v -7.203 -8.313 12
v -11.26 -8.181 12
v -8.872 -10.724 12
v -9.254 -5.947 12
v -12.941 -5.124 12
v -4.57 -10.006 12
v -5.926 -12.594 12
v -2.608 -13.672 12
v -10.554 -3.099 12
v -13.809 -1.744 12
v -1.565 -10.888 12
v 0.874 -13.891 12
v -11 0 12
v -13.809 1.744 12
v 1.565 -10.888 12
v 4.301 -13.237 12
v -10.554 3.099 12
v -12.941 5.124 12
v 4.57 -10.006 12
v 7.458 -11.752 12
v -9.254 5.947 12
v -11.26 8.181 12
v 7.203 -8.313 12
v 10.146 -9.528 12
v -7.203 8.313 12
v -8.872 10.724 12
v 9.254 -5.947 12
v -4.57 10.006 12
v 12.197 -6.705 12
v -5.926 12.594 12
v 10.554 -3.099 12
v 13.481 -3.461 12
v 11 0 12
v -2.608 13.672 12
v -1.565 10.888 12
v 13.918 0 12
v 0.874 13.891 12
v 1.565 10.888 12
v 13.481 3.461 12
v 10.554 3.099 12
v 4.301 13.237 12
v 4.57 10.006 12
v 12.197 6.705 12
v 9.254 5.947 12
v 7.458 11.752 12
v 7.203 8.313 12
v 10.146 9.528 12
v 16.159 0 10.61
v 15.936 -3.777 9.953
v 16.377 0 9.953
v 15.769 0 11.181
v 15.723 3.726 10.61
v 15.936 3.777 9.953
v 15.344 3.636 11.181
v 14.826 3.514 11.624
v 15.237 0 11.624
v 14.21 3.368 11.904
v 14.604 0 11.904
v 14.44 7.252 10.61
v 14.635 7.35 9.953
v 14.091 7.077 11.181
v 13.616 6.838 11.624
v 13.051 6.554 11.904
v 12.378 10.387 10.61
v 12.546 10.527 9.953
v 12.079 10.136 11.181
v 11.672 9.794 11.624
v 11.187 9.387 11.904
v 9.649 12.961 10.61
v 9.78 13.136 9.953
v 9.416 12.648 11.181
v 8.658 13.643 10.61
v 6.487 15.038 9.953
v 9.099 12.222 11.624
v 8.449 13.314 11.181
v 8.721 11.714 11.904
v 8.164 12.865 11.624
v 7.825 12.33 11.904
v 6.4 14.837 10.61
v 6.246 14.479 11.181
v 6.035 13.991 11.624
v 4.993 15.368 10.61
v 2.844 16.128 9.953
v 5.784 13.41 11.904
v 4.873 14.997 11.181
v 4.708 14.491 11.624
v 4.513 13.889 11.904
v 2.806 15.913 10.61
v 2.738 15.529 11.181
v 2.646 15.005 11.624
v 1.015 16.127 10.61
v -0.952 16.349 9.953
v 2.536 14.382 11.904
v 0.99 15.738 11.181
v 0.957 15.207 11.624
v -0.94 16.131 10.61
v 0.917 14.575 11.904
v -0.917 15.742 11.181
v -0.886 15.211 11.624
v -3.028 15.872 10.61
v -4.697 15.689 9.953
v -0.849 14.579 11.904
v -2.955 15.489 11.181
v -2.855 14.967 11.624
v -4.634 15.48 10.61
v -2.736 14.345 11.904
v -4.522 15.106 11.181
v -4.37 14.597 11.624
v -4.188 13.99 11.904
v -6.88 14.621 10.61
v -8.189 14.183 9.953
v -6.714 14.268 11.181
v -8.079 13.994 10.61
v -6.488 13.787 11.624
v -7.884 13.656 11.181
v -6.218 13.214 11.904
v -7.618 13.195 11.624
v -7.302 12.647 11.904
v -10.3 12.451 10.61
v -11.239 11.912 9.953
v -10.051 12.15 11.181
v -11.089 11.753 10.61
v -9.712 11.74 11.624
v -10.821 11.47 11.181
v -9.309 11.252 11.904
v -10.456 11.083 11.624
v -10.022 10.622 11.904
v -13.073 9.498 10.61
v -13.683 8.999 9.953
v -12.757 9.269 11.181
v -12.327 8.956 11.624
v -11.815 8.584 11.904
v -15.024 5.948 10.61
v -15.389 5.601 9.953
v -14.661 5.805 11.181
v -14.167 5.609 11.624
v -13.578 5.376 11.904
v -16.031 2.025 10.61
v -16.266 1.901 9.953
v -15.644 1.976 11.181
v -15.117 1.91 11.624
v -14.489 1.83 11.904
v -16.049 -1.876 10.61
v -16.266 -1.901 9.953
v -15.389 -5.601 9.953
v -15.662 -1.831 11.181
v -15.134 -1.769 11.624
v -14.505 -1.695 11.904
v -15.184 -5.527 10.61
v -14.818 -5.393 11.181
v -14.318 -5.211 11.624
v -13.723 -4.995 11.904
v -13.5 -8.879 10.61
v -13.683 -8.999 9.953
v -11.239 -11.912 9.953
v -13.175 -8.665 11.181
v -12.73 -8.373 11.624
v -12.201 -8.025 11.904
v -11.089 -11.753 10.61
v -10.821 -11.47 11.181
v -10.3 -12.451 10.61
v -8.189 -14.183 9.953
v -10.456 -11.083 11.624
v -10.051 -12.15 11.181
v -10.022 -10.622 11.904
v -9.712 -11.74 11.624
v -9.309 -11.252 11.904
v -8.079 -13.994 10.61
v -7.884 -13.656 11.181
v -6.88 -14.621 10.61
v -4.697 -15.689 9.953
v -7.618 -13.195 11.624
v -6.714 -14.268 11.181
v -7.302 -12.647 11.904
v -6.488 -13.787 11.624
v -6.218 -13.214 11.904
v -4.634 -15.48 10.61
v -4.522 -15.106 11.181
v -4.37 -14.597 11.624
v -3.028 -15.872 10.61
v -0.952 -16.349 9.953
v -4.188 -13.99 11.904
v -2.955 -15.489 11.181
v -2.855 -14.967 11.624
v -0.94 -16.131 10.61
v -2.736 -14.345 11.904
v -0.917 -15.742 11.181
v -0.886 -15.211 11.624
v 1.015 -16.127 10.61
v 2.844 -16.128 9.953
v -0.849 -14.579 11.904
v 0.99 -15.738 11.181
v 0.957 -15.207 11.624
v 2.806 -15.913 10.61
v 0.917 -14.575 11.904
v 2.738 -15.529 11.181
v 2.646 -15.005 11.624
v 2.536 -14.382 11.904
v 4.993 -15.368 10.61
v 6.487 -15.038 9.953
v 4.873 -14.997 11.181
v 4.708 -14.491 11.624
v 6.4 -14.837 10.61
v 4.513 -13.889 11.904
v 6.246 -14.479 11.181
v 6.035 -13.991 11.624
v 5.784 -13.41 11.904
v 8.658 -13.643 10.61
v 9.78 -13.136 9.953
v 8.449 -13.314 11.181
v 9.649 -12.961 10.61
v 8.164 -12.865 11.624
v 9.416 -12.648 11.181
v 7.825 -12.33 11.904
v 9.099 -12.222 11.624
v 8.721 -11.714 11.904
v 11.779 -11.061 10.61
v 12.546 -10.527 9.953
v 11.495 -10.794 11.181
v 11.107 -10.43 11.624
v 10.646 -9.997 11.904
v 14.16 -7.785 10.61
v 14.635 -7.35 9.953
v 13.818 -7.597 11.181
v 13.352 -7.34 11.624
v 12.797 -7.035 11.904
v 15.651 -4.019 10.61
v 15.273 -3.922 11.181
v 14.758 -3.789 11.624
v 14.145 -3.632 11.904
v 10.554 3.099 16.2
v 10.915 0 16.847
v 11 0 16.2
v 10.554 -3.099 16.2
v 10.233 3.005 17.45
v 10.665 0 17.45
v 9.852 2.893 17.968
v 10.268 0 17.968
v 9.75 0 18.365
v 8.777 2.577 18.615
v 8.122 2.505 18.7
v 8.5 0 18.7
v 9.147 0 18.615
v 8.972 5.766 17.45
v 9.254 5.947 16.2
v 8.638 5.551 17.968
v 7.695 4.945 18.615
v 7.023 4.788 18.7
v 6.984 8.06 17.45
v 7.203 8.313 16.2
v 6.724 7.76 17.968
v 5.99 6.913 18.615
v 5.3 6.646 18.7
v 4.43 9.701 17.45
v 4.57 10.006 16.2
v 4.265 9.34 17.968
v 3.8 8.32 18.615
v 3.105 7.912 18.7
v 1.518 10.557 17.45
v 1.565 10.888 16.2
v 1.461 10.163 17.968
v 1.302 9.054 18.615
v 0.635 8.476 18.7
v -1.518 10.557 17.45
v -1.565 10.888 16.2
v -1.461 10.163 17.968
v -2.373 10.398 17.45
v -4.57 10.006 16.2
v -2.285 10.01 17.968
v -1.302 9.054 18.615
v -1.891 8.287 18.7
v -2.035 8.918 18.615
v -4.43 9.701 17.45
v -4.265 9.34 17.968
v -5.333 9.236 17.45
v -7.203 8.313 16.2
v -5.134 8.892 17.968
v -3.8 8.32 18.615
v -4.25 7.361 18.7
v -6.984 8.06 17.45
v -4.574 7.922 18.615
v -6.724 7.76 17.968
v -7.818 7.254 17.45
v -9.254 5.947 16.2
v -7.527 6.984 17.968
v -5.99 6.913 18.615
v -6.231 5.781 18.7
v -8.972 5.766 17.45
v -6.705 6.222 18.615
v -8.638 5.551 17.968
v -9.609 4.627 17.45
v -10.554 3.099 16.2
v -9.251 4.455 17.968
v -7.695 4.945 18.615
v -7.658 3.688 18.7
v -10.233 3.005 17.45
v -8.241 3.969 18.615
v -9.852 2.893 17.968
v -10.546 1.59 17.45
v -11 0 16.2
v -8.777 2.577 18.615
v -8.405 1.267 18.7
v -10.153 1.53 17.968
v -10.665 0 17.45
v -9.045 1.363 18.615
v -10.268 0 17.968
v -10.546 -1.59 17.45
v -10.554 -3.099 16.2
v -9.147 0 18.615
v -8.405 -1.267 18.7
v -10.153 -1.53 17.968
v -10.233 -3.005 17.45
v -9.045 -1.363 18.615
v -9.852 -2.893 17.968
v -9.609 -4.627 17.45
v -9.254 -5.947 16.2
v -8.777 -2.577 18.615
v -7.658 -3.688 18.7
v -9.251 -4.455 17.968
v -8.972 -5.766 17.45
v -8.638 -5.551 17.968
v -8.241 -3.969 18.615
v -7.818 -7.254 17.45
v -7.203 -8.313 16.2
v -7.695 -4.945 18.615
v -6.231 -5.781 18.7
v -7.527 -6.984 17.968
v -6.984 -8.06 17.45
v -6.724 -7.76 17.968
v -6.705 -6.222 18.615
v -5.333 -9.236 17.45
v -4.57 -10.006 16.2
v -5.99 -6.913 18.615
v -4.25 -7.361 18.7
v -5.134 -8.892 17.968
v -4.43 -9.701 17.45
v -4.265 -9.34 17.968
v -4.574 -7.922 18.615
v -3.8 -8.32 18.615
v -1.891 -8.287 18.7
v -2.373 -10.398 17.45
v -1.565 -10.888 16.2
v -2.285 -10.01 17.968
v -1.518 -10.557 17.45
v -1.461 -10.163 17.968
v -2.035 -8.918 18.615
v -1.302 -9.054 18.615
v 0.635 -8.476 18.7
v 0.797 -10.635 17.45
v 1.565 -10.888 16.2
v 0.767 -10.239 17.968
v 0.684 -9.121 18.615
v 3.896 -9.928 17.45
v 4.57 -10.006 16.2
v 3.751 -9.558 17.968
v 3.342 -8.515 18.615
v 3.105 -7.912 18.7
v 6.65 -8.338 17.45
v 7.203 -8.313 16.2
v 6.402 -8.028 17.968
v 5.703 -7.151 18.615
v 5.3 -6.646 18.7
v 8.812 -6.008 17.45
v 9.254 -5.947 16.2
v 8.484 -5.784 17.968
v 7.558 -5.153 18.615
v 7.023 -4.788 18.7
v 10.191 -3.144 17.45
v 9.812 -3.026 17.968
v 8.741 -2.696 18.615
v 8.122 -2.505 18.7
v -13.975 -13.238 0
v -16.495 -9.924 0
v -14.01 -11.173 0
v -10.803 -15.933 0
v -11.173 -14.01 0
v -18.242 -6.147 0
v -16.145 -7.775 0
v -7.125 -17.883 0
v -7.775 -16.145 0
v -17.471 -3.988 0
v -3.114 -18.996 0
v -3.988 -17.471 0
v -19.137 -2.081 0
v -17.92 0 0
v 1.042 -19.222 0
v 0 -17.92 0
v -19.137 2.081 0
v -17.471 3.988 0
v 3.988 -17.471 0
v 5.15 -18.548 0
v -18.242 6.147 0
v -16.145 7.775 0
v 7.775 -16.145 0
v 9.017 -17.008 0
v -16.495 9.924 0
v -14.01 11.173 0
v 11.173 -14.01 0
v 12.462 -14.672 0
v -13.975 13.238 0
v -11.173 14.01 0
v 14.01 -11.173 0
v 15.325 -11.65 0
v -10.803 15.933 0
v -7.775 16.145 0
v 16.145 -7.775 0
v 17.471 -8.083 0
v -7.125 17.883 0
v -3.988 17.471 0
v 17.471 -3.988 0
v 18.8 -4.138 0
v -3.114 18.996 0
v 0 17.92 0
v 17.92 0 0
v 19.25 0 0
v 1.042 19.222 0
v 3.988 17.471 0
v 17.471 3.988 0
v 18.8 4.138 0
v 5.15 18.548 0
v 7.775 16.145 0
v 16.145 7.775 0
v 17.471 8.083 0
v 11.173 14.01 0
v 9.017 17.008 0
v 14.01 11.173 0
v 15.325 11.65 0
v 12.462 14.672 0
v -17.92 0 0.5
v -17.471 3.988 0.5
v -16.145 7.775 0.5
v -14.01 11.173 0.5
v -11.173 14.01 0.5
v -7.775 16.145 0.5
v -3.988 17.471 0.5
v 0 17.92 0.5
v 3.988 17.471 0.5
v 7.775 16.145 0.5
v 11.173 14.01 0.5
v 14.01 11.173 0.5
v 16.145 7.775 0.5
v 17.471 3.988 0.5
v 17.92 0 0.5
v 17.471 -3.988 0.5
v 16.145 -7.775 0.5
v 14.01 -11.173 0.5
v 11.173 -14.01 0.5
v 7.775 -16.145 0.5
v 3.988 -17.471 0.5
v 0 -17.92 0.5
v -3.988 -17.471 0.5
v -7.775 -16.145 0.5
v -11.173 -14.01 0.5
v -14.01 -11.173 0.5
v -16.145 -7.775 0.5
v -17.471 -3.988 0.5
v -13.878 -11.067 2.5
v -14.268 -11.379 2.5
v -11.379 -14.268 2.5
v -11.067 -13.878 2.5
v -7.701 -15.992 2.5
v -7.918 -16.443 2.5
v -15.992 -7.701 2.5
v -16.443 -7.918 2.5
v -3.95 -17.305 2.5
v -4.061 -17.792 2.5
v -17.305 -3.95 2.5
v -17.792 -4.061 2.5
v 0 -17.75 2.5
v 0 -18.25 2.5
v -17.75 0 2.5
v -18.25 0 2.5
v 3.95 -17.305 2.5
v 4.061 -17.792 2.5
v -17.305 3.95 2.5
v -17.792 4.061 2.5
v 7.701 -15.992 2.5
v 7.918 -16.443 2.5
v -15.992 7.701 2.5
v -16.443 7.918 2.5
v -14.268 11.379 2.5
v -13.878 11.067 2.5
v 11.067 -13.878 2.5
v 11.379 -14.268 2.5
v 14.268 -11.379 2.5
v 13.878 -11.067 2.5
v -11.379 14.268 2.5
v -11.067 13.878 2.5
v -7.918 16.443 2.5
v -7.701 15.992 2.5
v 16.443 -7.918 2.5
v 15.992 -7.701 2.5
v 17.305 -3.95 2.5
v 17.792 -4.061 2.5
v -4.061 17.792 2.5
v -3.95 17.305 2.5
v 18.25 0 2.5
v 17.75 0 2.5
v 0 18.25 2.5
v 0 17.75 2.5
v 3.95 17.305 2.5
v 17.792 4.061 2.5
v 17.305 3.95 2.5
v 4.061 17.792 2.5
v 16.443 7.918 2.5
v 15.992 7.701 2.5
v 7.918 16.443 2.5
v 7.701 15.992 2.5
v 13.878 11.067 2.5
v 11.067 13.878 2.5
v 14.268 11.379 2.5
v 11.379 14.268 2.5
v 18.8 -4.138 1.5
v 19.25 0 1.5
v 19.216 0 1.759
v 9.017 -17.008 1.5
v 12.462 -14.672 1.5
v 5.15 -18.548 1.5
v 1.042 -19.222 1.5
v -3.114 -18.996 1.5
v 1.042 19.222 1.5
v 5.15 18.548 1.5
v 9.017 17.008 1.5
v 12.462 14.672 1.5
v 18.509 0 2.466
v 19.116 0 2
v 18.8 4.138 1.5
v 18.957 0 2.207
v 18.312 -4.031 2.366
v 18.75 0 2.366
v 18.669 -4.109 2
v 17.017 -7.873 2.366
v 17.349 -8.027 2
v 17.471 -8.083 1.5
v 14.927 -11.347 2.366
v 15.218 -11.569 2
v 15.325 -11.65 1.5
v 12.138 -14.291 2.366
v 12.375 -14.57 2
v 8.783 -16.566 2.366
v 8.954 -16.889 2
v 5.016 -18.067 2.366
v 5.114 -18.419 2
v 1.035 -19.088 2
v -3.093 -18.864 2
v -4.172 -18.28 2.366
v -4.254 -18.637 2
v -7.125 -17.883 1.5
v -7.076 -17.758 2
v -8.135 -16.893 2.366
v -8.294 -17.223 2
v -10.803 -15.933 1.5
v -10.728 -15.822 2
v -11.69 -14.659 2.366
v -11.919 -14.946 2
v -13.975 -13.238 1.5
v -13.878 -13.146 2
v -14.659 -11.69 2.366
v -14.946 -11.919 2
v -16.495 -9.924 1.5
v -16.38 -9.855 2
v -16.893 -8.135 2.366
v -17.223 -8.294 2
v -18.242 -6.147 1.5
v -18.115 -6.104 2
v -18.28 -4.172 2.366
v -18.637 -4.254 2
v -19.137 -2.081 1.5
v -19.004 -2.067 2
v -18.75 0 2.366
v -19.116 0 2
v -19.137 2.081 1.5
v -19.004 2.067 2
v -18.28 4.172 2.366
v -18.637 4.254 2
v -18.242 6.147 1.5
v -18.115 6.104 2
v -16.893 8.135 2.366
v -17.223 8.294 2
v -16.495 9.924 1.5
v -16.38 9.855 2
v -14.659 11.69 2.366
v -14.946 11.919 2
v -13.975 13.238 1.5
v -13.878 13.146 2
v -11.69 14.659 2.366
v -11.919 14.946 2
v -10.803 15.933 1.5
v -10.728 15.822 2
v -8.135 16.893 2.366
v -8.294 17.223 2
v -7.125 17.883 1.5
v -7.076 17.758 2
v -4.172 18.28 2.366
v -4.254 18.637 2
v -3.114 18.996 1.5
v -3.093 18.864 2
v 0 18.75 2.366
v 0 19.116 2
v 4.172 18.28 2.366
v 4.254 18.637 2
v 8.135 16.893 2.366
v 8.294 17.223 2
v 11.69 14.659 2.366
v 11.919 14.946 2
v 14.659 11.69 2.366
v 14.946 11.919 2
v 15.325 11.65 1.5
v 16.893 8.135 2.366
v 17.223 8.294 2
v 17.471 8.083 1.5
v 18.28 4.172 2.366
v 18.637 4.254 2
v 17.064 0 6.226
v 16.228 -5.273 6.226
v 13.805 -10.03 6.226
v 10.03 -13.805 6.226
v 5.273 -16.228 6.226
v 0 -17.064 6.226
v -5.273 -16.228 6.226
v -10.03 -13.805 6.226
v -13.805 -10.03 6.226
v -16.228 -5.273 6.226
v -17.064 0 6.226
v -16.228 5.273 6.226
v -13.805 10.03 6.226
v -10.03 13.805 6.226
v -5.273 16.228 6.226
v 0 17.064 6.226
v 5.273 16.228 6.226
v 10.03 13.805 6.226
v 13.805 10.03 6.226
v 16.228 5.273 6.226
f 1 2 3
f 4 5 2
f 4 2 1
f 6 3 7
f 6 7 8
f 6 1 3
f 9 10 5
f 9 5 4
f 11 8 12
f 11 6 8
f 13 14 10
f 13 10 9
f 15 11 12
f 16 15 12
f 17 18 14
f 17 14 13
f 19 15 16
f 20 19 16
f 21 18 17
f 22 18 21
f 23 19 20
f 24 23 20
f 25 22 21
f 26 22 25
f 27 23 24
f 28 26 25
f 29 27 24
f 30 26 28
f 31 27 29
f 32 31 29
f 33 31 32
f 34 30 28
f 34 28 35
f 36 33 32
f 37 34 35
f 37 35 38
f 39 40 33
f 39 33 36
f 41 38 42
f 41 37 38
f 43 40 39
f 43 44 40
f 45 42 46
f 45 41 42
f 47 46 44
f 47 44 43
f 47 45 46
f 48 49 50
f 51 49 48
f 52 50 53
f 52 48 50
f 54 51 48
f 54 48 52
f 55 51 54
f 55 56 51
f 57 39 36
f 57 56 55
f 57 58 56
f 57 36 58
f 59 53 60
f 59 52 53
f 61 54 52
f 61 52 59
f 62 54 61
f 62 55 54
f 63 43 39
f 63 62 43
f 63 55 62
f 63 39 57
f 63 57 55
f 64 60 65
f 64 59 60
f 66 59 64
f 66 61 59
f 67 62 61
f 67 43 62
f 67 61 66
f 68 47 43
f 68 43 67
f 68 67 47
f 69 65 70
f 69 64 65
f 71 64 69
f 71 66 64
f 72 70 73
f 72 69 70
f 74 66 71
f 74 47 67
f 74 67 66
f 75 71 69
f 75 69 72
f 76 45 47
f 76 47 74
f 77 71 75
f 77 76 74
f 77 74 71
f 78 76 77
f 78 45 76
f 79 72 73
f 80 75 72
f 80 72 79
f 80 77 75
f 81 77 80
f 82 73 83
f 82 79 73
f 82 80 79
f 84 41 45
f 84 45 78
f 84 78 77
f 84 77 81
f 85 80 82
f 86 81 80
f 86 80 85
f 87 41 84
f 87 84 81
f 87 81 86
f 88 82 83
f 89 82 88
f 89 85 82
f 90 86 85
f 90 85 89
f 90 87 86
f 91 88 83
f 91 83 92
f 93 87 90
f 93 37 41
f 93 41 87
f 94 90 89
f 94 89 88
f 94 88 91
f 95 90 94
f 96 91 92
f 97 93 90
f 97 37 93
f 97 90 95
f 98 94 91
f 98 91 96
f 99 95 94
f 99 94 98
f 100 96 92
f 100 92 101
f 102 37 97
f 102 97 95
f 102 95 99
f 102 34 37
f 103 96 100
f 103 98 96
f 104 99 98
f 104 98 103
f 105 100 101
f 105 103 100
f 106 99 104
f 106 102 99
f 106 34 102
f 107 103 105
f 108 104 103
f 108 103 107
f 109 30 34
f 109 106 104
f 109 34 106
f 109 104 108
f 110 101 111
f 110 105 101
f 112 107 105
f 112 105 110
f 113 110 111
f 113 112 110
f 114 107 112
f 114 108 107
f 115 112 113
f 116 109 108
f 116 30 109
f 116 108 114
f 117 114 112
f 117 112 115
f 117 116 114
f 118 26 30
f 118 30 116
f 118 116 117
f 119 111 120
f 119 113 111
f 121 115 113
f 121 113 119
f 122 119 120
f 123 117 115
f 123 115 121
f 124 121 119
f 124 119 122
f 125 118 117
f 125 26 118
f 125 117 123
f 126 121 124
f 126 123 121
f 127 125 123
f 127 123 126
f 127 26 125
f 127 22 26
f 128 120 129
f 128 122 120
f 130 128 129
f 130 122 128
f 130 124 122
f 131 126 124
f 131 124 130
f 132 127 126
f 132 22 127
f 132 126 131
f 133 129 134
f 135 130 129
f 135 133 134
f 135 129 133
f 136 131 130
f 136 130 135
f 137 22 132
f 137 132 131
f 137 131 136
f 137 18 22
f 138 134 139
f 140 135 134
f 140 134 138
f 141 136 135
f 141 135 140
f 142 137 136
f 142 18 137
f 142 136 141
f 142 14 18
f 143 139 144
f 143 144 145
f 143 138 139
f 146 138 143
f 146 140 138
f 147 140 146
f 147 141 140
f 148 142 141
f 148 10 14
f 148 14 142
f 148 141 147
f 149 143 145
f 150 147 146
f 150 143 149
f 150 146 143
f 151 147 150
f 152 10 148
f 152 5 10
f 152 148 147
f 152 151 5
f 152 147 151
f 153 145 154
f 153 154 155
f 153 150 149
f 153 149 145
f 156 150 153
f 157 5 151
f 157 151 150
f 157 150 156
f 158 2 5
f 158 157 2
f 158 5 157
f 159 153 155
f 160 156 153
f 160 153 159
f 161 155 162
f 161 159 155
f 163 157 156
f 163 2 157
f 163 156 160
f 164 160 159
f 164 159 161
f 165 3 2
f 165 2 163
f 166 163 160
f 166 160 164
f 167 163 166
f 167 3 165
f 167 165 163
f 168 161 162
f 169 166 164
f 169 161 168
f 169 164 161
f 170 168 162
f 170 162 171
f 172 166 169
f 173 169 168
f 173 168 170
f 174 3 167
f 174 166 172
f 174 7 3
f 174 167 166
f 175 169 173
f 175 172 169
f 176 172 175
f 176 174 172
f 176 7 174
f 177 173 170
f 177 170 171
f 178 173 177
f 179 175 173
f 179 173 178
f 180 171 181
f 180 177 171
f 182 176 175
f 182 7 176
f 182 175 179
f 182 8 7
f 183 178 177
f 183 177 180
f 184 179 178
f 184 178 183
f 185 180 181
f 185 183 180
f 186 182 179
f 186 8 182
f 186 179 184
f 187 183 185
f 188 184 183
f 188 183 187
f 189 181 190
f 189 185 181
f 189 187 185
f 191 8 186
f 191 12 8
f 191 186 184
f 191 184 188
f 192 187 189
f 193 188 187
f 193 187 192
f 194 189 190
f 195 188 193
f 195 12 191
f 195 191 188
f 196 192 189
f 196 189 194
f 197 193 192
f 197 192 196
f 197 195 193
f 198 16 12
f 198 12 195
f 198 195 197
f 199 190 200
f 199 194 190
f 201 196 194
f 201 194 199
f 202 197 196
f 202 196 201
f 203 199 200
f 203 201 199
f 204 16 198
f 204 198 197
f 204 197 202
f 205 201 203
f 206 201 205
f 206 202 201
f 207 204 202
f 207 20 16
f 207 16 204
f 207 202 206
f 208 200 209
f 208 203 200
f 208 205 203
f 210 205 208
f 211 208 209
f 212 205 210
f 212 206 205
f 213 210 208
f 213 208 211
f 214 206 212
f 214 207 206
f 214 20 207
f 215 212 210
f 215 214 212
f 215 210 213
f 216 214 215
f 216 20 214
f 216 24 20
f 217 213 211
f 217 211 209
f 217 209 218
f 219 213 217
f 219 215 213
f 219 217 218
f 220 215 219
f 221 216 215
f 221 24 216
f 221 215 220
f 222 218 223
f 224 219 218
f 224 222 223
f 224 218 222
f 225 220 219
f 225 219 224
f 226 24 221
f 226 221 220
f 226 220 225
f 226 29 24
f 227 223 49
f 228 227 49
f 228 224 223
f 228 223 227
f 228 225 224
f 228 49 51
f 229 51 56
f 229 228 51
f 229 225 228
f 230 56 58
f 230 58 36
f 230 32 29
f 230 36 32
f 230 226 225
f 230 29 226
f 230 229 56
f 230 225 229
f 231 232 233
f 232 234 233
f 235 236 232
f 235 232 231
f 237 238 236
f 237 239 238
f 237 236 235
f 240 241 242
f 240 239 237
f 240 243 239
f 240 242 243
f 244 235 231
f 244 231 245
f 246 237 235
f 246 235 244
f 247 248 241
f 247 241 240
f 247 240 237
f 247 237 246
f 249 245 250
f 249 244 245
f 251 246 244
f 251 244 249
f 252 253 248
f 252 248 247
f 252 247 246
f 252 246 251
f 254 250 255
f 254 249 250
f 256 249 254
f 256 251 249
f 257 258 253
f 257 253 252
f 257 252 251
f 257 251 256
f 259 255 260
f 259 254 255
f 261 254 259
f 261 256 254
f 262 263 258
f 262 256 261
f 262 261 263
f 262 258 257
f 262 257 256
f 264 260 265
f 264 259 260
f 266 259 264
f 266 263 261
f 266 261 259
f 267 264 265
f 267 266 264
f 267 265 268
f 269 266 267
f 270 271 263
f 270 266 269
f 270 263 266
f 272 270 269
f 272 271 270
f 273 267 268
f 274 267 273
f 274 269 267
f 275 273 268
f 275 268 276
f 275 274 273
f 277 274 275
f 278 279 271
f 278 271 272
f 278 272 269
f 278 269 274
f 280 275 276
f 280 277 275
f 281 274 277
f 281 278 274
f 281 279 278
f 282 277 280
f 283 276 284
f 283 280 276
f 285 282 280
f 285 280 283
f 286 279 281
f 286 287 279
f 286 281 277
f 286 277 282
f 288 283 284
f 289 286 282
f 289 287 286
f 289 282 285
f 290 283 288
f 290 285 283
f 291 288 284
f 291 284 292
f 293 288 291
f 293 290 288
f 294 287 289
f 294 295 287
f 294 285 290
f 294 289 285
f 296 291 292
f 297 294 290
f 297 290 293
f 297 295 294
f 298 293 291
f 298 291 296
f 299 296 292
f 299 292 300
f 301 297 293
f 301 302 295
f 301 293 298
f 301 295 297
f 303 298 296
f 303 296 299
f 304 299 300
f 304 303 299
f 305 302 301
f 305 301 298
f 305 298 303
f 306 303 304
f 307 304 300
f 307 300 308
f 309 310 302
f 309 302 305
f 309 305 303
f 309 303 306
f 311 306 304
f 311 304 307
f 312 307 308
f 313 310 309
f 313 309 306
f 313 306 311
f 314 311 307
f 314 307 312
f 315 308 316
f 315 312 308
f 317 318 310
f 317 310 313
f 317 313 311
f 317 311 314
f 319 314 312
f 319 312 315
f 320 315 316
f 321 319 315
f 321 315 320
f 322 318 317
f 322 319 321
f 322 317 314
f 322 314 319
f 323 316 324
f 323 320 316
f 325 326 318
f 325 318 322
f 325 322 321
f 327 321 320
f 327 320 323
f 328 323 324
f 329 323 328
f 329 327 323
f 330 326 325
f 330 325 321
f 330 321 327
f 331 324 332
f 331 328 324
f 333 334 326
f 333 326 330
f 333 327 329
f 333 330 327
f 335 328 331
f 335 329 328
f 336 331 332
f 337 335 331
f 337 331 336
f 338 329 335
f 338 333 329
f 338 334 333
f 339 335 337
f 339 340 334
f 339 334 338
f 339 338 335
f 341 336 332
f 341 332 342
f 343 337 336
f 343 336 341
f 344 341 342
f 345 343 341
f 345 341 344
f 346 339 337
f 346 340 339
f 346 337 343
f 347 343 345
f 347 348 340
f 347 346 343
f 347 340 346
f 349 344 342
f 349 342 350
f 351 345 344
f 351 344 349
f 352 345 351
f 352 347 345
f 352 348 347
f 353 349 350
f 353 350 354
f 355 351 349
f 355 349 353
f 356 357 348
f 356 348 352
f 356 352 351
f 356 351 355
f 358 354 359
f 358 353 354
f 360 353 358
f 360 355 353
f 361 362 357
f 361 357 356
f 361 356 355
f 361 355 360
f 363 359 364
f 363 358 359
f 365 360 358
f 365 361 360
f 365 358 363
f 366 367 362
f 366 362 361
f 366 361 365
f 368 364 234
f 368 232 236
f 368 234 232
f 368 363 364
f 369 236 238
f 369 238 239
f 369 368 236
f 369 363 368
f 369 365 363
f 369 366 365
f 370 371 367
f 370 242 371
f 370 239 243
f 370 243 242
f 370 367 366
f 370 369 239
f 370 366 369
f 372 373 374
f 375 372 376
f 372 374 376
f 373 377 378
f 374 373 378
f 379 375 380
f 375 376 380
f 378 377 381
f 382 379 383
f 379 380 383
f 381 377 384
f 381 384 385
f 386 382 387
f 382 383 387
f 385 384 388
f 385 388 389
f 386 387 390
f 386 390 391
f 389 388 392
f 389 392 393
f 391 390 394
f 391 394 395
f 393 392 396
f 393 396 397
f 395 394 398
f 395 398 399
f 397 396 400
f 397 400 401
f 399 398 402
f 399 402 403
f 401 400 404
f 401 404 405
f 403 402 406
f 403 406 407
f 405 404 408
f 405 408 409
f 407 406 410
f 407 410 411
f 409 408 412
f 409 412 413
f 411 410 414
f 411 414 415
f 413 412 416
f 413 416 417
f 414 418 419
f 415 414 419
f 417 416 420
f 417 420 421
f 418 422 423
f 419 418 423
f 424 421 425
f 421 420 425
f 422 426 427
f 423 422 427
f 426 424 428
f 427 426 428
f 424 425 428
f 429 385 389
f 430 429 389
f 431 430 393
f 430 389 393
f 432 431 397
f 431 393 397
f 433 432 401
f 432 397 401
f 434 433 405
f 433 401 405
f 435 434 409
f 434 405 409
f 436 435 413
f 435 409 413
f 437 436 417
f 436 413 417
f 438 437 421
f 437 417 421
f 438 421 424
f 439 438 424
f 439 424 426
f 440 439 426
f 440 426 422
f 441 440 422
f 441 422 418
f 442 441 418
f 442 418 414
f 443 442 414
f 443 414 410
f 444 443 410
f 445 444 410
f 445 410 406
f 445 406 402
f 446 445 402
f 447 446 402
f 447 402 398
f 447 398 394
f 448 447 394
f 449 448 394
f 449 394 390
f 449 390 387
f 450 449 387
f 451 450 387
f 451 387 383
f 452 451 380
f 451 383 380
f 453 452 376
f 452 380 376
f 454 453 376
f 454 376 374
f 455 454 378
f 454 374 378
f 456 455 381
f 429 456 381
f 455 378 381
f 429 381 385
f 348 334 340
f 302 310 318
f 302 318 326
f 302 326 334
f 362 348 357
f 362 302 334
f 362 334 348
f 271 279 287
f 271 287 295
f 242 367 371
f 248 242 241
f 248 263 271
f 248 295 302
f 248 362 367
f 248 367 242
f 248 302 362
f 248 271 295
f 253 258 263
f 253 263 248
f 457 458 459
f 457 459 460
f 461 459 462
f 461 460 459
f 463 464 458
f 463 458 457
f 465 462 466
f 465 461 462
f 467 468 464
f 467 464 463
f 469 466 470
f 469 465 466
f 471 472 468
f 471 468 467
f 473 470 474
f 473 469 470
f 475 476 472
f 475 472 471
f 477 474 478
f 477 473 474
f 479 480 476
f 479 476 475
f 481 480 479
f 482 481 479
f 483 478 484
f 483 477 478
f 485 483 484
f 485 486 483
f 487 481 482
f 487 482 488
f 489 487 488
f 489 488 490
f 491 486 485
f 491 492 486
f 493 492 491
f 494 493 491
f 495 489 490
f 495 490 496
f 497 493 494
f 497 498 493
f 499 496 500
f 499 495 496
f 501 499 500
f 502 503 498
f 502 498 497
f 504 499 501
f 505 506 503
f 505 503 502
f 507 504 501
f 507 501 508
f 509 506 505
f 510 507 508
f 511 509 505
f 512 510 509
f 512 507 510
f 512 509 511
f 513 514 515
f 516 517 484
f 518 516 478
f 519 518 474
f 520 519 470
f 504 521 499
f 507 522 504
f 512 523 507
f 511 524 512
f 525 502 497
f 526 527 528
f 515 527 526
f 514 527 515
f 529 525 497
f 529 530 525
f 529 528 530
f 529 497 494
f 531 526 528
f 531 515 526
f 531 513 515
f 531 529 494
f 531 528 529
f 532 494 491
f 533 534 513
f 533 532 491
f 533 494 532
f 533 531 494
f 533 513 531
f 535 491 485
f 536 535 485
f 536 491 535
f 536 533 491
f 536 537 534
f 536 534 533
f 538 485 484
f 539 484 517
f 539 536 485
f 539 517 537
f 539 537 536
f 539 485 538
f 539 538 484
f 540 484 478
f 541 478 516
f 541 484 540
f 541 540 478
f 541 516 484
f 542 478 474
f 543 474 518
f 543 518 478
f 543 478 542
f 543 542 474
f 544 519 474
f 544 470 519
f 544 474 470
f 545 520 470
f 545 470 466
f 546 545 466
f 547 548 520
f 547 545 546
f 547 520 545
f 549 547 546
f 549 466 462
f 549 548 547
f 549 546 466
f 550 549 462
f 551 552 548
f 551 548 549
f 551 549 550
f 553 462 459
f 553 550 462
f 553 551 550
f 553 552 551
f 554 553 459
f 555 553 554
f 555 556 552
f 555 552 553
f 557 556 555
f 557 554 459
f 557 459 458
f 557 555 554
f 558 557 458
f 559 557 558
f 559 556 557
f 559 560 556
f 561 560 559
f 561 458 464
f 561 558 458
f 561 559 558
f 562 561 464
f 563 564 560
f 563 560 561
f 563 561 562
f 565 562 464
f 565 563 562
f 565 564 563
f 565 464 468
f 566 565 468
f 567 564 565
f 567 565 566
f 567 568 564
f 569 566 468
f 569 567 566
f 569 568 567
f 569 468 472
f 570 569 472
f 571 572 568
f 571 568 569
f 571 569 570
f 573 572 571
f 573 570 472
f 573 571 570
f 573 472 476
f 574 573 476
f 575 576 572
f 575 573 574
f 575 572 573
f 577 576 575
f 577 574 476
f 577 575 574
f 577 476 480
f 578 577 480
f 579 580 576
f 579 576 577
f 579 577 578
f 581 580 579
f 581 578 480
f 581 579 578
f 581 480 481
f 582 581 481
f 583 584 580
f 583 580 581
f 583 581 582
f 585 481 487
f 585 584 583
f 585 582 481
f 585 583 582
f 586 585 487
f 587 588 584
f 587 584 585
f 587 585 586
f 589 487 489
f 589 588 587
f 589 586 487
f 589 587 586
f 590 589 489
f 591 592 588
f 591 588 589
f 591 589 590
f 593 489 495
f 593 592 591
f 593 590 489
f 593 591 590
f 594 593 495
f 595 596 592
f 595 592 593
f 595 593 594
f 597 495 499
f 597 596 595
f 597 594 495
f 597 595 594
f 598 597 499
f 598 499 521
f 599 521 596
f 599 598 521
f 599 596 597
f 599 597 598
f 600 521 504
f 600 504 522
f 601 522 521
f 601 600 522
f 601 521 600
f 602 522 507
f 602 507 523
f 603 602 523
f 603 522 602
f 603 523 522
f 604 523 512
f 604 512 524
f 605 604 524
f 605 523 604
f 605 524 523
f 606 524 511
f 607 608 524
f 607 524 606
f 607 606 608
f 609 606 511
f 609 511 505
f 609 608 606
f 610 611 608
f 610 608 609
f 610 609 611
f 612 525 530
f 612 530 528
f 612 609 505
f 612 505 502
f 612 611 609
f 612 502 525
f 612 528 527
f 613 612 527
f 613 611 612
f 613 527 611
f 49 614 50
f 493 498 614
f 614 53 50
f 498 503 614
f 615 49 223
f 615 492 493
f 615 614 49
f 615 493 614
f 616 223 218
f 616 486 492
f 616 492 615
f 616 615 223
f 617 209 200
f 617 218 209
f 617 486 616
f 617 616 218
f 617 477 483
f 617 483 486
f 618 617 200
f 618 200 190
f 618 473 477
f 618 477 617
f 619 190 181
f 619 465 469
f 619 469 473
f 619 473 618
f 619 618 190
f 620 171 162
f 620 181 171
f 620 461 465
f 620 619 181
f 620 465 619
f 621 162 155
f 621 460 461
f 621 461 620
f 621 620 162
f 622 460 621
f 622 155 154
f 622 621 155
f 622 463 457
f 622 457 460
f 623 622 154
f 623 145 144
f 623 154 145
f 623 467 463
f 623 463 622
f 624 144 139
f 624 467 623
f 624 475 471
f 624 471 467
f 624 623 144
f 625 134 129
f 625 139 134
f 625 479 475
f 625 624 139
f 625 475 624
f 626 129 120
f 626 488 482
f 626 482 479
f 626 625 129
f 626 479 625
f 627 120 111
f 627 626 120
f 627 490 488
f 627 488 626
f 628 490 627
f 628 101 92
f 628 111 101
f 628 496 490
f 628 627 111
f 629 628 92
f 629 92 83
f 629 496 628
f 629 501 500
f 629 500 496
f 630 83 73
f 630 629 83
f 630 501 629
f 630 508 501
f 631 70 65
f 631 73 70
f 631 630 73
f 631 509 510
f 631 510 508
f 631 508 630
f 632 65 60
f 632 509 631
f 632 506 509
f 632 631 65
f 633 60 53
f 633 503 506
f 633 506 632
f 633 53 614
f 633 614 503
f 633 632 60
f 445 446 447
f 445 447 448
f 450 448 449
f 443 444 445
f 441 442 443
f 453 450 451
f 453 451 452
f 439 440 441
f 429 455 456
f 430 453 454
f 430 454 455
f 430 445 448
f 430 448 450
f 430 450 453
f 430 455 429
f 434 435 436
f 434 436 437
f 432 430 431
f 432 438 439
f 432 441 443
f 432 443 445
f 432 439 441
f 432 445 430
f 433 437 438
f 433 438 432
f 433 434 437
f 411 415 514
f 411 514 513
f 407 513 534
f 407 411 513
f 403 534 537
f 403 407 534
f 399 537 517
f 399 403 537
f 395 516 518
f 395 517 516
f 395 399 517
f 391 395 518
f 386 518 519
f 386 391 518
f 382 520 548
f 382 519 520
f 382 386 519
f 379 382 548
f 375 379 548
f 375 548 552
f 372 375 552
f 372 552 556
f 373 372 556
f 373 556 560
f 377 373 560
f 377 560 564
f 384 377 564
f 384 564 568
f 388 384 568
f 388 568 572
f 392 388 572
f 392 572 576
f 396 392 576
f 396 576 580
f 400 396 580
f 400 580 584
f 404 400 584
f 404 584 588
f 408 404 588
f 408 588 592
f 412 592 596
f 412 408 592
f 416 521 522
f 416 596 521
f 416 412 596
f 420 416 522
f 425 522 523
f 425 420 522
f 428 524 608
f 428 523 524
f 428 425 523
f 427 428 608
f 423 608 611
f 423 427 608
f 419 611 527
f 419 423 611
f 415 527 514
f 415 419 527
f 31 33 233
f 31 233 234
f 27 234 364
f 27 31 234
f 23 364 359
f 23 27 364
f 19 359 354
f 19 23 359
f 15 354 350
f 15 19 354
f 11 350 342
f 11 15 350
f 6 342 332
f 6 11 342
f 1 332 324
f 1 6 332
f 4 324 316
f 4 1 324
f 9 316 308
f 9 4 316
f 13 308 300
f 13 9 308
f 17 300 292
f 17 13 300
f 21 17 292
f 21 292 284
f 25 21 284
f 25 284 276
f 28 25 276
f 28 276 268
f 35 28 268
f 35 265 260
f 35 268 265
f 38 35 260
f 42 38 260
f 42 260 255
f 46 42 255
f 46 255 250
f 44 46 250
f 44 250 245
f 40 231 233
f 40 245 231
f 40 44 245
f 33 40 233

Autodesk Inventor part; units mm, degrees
ref_plane "YZ Plane" through (0, 0, 0) normal (1, 0, 0) x (0, 1, 0)
ref_plane "XZ Plane" through (0, 0, 0) normal (0, 1, 0) x (-1, 0, 0)
sketch "Sketch1" plane through (0, 0, 0) normal (0, 0, 1) x (1, 0, 0)
  circle A0 centre (0, 0) radius 19.25
  dimension "d0" = 38.5
extrude "Extrusion1" add sketch "Sketch1" along normal blind 2.5
sketch "Sketch2" plane through (0, 0, 2.5) normal (0, 0, 1) x (1, 0, 0)
  circle A0 centre (0, 0) radius 17.75
  dimension "d3" = 35.5
ref_plane "Work Plane1" through (0, 0, 12) normal (0, 0, 1) x (1, 0, 0)
sketch "Sketch3" plane through (0, 0, 12) normal (0, 0, 1) x (1, 0, 0)
  circle A0 centre (0, 0) radius 16
  dimension "d5" = 32
loft "Loft1" add profiles "Sketch2", "Sketch3"
fillet "Fillet1" radius 2.5 1 edges at (-16, 0, 12)
fillet "Fillet2" radius 1 1 edges at (-19.25, 0, 2.5)
sketch "Sketch4" plane through (0, 0, 12) normal (0, 0, 1) x (1, 0, 0)
  circle A0 centre (0, 0) radius 11
  dimension "d12" = 22
extrude "Extrusion2" add sketch "Sketch4" along normal blind 6.7
fillet "Fillet3" radius 2.5 1 edges at (-11, 0, 18.7)
sketch "Sketch5" plane through (0, 0, 0) normal (0, 0, -1) x (-1, 0, 0)
  circle A0 centre (0, 0) radius 17.92
  circle A1 centre (0, 0) radius 19.25 projected
  dimension "d16" = 1.33
extrude "Extrusion3" cut sketch "Sketch5" against normal blind 0.5 contours A0
properties part number "TongueSpeaker"
